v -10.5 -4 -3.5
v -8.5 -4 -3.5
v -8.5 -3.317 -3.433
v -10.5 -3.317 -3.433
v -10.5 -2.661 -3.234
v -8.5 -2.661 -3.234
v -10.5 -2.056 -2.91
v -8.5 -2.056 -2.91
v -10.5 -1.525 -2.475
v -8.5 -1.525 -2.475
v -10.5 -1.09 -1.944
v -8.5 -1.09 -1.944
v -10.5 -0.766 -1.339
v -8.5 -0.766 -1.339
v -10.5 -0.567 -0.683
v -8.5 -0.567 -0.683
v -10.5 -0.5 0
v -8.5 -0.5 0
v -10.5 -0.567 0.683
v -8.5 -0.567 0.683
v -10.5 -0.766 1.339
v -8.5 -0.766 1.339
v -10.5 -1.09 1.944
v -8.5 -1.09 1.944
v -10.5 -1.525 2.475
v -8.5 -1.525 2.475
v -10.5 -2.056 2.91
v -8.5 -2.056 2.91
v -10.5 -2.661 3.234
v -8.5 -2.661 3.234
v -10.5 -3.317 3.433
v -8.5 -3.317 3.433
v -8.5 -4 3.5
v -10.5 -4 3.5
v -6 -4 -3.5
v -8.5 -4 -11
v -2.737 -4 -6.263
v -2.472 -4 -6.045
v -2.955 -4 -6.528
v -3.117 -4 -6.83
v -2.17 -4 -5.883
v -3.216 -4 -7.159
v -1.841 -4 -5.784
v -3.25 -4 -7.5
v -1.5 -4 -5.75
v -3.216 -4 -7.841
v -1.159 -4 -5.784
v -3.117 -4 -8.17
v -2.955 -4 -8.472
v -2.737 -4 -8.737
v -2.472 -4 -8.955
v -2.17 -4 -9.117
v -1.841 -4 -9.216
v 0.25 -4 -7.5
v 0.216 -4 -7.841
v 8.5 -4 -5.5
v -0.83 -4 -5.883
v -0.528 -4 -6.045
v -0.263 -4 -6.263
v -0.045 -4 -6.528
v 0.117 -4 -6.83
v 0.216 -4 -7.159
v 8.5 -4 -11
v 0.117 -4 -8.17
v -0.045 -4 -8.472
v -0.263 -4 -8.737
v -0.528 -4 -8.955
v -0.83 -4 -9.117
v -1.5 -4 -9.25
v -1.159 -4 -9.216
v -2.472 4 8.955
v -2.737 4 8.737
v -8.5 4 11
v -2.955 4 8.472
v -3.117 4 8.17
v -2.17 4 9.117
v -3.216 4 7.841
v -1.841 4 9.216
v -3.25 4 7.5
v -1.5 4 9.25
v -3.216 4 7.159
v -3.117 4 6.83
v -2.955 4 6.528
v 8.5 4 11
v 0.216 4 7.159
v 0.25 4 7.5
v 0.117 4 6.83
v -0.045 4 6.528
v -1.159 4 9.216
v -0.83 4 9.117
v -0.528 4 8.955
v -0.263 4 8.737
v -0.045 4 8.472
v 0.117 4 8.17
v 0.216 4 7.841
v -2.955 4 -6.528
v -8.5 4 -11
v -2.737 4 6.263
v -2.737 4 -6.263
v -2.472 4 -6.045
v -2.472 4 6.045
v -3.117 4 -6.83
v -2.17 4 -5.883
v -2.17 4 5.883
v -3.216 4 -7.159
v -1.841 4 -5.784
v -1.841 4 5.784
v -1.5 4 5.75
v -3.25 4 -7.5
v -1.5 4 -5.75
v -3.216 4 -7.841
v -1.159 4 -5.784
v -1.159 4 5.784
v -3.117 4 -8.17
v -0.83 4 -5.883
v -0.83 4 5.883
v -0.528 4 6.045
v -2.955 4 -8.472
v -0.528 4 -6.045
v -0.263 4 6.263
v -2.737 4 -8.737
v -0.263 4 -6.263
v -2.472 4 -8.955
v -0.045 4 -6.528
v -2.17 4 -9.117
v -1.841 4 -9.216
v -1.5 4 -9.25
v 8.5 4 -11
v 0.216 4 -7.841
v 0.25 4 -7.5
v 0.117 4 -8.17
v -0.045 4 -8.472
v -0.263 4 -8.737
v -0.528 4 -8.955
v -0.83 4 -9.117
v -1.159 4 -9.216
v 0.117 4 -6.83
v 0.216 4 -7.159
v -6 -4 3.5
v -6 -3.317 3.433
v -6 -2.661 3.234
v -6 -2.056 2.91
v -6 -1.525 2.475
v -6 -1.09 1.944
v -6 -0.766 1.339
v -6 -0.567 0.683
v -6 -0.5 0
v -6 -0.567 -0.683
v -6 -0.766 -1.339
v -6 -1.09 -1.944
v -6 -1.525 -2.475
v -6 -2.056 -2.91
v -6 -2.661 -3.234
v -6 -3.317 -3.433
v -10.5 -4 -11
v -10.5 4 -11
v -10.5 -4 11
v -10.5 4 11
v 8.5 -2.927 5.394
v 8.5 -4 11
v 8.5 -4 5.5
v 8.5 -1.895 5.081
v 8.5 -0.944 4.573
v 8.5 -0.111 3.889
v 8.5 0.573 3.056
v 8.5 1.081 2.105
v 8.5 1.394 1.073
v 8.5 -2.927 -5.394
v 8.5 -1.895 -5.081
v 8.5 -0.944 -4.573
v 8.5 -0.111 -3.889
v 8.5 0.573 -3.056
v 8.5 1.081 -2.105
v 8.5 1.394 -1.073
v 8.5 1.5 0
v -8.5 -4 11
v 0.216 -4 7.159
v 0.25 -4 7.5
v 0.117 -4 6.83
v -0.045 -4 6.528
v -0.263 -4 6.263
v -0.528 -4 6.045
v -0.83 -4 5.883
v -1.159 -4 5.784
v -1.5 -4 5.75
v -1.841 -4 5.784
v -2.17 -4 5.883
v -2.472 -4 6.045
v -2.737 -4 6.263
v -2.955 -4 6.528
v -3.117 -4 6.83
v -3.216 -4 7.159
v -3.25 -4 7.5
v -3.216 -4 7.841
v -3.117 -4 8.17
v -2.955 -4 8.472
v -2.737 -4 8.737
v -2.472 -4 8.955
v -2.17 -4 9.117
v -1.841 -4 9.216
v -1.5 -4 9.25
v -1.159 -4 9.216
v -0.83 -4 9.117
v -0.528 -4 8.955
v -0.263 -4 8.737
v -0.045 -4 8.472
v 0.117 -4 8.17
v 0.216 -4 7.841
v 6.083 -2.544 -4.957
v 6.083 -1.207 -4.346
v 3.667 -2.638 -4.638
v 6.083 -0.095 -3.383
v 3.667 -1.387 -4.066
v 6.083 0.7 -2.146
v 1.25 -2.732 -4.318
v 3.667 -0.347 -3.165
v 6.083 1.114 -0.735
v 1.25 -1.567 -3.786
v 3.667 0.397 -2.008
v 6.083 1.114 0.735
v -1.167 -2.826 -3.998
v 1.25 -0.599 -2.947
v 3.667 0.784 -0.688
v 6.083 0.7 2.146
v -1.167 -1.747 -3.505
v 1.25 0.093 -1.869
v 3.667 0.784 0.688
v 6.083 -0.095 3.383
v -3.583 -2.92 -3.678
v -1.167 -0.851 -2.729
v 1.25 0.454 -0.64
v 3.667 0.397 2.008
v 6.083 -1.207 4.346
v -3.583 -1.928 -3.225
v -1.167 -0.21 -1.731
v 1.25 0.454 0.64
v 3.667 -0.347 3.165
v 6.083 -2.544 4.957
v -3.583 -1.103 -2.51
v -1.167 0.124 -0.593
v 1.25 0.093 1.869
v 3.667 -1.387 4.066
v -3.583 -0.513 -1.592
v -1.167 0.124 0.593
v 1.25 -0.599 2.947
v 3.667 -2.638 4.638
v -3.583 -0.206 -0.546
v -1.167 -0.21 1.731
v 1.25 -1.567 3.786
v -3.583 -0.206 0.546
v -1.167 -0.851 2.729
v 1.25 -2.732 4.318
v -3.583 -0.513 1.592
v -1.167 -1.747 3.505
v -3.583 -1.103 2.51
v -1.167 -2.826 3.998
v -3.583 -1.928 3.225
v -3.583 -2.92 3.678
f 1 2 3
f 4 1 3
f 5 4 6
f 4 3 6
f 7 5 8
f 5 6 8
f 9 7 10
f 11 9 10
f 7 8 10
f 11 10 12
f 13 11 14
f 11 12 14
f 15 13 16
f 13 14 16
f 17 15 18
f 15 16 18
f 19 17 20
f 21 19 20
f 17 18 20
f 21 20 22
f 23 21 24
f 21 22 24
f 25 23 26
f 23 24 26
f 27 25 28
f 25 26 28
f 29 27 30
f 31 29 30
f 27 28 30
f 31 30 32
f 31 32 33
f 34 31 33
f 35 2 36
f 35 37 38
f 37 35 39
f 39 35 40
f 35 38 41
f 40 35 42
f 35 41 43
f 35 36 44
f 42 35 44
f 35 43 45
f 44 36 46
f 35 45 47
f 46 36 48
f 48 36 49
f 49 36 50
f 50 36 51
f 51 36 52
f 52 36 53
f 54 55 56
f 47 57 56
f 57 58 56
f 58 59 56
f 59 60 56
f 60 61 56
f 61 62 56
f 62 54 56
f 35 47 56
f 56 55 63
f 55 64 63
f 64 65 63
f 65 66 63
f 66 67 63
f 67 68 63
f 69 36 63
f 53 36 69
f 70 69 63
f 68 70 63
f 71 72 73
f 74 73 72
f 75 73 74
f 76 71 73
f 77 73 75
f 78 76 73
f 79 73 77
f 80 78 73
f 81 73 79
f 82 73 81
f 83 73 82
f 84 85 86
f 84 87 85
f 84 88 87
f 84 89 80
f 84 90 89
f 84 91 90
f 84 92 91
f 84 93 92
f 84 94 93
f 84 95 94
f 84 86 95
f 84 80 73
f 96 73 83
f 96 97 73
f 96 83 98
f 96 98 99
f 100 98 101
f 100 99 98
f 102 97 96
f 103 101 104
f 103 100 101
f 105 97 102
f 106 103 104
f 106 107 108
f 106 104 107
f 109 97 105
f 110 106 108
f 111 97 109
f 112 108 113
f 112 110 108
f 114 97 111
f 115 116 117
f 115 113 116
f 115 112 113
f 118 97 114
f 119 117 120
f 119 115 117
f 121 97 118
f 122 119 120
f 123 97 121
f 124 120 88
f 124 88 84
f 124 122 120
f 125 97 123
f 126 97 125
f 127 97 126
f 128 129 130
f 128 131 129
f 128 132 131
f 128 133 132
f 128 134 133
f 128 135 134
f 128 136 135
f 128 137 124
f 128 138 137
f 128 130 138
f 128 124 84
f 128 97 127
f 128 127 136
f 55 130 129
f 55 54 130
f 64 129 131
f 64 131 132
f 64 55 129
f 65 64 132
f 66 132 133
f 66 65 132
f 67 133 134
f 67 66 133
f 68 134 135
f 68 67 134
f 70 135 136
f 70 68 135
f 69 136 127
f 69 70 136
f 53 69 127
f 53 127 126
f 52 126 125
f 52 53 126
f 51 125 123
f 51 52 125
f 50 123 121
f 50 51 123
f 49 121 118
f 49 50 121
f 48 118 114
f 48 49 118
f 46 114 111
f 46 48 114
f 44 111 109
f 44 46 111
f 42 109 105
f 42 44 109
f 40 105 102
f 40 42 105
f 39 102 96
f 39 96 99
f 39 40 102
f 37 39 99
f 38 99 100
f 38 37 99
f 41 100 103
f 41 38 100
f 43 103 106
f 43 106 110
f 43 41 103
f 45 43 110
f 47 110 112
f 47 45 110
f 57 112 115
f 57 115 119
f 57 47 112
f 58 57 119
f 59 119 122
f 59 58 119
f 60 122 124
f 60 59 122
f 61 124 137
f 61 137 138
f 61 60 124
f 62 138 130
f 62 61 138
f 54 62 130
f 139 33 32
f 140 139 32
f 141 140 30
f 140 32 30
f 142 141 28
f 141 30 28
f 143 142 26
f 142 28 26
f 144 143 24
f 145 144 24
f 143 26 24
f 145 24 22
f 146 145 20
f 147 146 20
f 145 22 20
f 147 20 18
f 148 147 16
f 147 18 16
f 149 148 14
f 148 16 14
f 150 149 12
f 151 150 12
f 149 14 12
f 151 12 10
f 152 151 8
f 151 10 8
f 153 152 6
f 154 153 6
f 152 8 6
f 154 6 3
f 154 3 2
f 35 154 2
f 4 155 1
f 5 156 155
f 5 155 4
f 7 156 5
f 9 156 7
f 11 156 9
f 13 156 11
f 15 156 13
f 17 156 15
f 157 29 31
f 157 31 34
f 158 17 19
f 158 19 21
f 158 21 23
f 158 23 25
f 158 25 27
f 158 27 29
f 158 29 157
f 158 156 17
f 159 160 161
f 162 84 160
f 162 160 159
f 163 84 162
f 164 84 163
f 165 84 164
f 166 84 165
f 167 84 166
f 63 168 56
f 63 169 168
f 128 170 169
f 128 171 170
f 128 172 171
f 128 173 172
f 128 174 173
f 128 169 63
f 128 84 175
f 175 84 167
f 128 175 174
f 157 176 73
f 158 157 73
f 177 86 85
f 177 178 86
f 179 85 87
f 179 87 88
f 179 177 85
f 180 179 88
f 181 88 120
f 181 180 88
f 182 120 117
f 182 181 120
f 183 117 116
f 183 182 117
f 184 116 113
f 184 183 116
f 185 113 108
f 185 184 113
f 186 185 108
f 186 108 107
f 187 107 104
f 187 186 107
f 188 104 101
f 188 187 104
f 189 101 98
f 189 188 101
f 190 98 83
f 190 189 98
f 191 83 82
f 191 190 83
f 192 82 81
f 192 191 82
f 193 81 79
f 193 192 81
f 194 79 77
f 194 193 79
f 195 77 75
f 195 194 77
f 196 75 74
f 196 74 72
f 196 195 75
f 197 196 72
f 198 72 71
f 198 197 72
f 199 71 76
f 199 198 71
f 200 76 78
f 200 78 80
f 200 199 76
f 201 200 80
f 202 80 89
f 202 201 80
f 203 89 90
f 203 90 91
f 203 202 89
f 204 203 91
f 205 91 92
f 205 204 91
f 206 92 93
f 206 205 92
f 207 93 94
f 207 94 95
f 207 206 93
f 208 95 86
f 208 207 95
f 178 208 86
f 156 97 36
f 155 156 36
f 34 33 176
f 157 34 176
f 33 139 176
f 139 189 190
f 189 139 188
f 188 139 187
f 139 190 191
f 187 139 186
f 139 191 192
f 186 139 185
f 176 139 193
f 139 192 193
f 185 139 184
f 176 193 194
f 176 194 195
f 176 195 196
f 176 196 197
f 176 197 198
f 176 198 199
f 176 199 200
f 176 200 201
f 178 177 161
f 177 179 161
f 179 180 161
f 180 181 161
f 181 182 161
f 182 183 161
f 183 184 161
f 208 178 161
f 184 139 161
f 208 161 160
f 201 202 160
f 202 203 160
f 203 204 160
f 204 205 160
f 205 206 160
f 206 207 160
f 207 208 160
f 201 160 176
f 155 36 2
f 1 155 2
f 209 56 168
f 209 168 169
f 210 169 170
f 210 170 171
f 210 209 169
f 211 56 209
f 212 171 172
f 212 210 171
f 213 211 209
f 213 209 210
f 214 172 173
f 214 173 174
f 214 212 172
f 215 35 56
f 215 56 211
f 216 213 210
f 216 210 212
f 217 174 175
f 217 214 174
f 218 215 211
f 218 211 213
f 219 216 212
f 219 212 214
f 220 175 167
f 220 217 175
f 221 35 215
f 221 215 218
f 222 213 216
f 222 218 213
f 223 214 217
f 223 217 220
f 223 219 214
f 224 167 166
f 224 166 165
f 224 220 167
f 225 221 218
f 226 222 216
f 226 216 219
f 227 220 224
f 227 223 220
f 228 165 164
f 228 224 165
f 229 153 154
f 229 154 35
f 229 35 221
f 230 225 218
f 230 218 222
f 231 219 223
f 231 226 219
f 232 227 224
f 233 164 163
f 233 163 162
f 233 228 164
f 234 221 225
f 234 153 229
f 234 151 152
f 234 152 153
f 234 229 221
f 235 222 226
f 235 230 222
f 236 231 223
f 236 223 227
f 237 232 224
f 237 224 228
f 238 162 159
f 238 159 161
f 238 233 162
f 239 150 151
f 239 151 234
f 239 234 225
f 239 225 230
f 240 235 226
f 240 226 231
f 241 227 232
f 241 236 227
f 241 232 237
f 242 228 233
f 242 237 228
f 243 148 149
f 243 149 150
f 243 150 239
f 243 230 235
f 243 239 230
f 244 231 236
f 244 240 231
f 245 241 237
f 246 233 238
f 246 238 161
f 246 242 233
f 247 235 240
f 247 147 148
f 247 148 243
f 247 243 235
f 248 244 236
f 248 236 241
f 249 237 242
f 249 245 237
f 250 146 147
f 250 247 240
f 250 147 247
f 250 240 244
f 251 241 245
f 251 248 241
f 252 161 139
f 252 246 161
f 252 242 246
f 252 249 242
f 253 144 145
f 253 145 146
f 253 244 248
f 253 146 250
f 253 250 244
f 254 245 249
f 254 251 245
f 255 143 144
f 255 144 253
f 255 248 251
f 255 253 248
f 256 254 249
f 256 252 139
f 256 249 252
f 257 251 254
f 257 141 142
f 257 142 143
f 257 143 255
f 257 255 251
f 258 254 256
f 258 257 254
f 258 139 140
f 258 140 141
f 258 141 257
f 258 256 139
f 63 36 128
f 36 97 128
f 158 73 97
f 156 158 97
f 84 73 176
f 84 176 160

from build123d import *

# Parameters (mm, degrees)
SKETCH_1_W          = 17
SKETCH_1_H          = 22
SKETCH_1_R          = 1.75
EXTRUDE_1_DEPTH     = 4
SKETCH_2_R          = 3.5
CUT_EXTRUDE_1_DEPTH = 2.5
SKETCH_4_R          = 5.5
SKETCH_3_R          = 3.5
EXTRUDE_2_DEPTH     = 2


with BuildPart() as part:
    # 草圖1 → 填料-伸長1 (new body, symmetric)
    with BuildSketch(Plane(origin=(0, 0, 0), x_dir=(1, 0, 0), z_dir=(0, 1, 0))):
        Rectangle(SKETCH_1_W, SKETCH_1_H)
        with Locations((-1.5, 7.5)):
            Circle(SKETCH_1_R, mode=Mode.SUBTRACT)
        with Locations((-1.5, -7.5)):
            Circle(SKETCH_1_R, mode=Mode.SUBTRACT)
    extrude(amount=EXTRUDE_1_DEPTH, both=True)

    # 草圖2 → 除料-伸長1 (cut)
    with BuildSketch(Plane.ZY.offset(8.5)):
        with Locations((0, -4)):
            Circle(SKETCH_2_R)
    extrude(amount=-CUT_EXTRUDE_1_DEPTH, mode=Mode.SUBTRACT)

    # 草圖4 → 除料-疊層拉伸1 section 0
    with BuildSketch(Plane(origin=(8.5, 0, 0), x_dir=(0, 0, -1), z_dir=(1, 0, 0))):
        with Locations((0, -4)):
            Circle(SKETCH_4_R)
    # 草圖3 → 除料-疊層拉伸1 section 1
    with BuildSketch(Plane.ZY.offset(6)):
        with Locations((0, -4)):
            Circle(SKETCH_3_R)
    loft(mode=Mode.SUBTRACT)

    # 草圖5 → 填料-伸長2 (add)
    with BuildSketch(Plane.ZY.offset(8.5)):
        with BuildLine():
            Line((3.5, -4), (11, -4))
            Line((11, -4), (11, 4))
            Line((11, 4), (-11, 4))
            Line((-11, 4), (-11, -4))
            Line((-11, -4), (-3.5, -4))
            ThreePointArc((-3.5, -4), (0, -0.5), (3.5, -4))
        make_face()
    extrude(amount=EXTRUDE_2_DEPTH)


solid = part.part
